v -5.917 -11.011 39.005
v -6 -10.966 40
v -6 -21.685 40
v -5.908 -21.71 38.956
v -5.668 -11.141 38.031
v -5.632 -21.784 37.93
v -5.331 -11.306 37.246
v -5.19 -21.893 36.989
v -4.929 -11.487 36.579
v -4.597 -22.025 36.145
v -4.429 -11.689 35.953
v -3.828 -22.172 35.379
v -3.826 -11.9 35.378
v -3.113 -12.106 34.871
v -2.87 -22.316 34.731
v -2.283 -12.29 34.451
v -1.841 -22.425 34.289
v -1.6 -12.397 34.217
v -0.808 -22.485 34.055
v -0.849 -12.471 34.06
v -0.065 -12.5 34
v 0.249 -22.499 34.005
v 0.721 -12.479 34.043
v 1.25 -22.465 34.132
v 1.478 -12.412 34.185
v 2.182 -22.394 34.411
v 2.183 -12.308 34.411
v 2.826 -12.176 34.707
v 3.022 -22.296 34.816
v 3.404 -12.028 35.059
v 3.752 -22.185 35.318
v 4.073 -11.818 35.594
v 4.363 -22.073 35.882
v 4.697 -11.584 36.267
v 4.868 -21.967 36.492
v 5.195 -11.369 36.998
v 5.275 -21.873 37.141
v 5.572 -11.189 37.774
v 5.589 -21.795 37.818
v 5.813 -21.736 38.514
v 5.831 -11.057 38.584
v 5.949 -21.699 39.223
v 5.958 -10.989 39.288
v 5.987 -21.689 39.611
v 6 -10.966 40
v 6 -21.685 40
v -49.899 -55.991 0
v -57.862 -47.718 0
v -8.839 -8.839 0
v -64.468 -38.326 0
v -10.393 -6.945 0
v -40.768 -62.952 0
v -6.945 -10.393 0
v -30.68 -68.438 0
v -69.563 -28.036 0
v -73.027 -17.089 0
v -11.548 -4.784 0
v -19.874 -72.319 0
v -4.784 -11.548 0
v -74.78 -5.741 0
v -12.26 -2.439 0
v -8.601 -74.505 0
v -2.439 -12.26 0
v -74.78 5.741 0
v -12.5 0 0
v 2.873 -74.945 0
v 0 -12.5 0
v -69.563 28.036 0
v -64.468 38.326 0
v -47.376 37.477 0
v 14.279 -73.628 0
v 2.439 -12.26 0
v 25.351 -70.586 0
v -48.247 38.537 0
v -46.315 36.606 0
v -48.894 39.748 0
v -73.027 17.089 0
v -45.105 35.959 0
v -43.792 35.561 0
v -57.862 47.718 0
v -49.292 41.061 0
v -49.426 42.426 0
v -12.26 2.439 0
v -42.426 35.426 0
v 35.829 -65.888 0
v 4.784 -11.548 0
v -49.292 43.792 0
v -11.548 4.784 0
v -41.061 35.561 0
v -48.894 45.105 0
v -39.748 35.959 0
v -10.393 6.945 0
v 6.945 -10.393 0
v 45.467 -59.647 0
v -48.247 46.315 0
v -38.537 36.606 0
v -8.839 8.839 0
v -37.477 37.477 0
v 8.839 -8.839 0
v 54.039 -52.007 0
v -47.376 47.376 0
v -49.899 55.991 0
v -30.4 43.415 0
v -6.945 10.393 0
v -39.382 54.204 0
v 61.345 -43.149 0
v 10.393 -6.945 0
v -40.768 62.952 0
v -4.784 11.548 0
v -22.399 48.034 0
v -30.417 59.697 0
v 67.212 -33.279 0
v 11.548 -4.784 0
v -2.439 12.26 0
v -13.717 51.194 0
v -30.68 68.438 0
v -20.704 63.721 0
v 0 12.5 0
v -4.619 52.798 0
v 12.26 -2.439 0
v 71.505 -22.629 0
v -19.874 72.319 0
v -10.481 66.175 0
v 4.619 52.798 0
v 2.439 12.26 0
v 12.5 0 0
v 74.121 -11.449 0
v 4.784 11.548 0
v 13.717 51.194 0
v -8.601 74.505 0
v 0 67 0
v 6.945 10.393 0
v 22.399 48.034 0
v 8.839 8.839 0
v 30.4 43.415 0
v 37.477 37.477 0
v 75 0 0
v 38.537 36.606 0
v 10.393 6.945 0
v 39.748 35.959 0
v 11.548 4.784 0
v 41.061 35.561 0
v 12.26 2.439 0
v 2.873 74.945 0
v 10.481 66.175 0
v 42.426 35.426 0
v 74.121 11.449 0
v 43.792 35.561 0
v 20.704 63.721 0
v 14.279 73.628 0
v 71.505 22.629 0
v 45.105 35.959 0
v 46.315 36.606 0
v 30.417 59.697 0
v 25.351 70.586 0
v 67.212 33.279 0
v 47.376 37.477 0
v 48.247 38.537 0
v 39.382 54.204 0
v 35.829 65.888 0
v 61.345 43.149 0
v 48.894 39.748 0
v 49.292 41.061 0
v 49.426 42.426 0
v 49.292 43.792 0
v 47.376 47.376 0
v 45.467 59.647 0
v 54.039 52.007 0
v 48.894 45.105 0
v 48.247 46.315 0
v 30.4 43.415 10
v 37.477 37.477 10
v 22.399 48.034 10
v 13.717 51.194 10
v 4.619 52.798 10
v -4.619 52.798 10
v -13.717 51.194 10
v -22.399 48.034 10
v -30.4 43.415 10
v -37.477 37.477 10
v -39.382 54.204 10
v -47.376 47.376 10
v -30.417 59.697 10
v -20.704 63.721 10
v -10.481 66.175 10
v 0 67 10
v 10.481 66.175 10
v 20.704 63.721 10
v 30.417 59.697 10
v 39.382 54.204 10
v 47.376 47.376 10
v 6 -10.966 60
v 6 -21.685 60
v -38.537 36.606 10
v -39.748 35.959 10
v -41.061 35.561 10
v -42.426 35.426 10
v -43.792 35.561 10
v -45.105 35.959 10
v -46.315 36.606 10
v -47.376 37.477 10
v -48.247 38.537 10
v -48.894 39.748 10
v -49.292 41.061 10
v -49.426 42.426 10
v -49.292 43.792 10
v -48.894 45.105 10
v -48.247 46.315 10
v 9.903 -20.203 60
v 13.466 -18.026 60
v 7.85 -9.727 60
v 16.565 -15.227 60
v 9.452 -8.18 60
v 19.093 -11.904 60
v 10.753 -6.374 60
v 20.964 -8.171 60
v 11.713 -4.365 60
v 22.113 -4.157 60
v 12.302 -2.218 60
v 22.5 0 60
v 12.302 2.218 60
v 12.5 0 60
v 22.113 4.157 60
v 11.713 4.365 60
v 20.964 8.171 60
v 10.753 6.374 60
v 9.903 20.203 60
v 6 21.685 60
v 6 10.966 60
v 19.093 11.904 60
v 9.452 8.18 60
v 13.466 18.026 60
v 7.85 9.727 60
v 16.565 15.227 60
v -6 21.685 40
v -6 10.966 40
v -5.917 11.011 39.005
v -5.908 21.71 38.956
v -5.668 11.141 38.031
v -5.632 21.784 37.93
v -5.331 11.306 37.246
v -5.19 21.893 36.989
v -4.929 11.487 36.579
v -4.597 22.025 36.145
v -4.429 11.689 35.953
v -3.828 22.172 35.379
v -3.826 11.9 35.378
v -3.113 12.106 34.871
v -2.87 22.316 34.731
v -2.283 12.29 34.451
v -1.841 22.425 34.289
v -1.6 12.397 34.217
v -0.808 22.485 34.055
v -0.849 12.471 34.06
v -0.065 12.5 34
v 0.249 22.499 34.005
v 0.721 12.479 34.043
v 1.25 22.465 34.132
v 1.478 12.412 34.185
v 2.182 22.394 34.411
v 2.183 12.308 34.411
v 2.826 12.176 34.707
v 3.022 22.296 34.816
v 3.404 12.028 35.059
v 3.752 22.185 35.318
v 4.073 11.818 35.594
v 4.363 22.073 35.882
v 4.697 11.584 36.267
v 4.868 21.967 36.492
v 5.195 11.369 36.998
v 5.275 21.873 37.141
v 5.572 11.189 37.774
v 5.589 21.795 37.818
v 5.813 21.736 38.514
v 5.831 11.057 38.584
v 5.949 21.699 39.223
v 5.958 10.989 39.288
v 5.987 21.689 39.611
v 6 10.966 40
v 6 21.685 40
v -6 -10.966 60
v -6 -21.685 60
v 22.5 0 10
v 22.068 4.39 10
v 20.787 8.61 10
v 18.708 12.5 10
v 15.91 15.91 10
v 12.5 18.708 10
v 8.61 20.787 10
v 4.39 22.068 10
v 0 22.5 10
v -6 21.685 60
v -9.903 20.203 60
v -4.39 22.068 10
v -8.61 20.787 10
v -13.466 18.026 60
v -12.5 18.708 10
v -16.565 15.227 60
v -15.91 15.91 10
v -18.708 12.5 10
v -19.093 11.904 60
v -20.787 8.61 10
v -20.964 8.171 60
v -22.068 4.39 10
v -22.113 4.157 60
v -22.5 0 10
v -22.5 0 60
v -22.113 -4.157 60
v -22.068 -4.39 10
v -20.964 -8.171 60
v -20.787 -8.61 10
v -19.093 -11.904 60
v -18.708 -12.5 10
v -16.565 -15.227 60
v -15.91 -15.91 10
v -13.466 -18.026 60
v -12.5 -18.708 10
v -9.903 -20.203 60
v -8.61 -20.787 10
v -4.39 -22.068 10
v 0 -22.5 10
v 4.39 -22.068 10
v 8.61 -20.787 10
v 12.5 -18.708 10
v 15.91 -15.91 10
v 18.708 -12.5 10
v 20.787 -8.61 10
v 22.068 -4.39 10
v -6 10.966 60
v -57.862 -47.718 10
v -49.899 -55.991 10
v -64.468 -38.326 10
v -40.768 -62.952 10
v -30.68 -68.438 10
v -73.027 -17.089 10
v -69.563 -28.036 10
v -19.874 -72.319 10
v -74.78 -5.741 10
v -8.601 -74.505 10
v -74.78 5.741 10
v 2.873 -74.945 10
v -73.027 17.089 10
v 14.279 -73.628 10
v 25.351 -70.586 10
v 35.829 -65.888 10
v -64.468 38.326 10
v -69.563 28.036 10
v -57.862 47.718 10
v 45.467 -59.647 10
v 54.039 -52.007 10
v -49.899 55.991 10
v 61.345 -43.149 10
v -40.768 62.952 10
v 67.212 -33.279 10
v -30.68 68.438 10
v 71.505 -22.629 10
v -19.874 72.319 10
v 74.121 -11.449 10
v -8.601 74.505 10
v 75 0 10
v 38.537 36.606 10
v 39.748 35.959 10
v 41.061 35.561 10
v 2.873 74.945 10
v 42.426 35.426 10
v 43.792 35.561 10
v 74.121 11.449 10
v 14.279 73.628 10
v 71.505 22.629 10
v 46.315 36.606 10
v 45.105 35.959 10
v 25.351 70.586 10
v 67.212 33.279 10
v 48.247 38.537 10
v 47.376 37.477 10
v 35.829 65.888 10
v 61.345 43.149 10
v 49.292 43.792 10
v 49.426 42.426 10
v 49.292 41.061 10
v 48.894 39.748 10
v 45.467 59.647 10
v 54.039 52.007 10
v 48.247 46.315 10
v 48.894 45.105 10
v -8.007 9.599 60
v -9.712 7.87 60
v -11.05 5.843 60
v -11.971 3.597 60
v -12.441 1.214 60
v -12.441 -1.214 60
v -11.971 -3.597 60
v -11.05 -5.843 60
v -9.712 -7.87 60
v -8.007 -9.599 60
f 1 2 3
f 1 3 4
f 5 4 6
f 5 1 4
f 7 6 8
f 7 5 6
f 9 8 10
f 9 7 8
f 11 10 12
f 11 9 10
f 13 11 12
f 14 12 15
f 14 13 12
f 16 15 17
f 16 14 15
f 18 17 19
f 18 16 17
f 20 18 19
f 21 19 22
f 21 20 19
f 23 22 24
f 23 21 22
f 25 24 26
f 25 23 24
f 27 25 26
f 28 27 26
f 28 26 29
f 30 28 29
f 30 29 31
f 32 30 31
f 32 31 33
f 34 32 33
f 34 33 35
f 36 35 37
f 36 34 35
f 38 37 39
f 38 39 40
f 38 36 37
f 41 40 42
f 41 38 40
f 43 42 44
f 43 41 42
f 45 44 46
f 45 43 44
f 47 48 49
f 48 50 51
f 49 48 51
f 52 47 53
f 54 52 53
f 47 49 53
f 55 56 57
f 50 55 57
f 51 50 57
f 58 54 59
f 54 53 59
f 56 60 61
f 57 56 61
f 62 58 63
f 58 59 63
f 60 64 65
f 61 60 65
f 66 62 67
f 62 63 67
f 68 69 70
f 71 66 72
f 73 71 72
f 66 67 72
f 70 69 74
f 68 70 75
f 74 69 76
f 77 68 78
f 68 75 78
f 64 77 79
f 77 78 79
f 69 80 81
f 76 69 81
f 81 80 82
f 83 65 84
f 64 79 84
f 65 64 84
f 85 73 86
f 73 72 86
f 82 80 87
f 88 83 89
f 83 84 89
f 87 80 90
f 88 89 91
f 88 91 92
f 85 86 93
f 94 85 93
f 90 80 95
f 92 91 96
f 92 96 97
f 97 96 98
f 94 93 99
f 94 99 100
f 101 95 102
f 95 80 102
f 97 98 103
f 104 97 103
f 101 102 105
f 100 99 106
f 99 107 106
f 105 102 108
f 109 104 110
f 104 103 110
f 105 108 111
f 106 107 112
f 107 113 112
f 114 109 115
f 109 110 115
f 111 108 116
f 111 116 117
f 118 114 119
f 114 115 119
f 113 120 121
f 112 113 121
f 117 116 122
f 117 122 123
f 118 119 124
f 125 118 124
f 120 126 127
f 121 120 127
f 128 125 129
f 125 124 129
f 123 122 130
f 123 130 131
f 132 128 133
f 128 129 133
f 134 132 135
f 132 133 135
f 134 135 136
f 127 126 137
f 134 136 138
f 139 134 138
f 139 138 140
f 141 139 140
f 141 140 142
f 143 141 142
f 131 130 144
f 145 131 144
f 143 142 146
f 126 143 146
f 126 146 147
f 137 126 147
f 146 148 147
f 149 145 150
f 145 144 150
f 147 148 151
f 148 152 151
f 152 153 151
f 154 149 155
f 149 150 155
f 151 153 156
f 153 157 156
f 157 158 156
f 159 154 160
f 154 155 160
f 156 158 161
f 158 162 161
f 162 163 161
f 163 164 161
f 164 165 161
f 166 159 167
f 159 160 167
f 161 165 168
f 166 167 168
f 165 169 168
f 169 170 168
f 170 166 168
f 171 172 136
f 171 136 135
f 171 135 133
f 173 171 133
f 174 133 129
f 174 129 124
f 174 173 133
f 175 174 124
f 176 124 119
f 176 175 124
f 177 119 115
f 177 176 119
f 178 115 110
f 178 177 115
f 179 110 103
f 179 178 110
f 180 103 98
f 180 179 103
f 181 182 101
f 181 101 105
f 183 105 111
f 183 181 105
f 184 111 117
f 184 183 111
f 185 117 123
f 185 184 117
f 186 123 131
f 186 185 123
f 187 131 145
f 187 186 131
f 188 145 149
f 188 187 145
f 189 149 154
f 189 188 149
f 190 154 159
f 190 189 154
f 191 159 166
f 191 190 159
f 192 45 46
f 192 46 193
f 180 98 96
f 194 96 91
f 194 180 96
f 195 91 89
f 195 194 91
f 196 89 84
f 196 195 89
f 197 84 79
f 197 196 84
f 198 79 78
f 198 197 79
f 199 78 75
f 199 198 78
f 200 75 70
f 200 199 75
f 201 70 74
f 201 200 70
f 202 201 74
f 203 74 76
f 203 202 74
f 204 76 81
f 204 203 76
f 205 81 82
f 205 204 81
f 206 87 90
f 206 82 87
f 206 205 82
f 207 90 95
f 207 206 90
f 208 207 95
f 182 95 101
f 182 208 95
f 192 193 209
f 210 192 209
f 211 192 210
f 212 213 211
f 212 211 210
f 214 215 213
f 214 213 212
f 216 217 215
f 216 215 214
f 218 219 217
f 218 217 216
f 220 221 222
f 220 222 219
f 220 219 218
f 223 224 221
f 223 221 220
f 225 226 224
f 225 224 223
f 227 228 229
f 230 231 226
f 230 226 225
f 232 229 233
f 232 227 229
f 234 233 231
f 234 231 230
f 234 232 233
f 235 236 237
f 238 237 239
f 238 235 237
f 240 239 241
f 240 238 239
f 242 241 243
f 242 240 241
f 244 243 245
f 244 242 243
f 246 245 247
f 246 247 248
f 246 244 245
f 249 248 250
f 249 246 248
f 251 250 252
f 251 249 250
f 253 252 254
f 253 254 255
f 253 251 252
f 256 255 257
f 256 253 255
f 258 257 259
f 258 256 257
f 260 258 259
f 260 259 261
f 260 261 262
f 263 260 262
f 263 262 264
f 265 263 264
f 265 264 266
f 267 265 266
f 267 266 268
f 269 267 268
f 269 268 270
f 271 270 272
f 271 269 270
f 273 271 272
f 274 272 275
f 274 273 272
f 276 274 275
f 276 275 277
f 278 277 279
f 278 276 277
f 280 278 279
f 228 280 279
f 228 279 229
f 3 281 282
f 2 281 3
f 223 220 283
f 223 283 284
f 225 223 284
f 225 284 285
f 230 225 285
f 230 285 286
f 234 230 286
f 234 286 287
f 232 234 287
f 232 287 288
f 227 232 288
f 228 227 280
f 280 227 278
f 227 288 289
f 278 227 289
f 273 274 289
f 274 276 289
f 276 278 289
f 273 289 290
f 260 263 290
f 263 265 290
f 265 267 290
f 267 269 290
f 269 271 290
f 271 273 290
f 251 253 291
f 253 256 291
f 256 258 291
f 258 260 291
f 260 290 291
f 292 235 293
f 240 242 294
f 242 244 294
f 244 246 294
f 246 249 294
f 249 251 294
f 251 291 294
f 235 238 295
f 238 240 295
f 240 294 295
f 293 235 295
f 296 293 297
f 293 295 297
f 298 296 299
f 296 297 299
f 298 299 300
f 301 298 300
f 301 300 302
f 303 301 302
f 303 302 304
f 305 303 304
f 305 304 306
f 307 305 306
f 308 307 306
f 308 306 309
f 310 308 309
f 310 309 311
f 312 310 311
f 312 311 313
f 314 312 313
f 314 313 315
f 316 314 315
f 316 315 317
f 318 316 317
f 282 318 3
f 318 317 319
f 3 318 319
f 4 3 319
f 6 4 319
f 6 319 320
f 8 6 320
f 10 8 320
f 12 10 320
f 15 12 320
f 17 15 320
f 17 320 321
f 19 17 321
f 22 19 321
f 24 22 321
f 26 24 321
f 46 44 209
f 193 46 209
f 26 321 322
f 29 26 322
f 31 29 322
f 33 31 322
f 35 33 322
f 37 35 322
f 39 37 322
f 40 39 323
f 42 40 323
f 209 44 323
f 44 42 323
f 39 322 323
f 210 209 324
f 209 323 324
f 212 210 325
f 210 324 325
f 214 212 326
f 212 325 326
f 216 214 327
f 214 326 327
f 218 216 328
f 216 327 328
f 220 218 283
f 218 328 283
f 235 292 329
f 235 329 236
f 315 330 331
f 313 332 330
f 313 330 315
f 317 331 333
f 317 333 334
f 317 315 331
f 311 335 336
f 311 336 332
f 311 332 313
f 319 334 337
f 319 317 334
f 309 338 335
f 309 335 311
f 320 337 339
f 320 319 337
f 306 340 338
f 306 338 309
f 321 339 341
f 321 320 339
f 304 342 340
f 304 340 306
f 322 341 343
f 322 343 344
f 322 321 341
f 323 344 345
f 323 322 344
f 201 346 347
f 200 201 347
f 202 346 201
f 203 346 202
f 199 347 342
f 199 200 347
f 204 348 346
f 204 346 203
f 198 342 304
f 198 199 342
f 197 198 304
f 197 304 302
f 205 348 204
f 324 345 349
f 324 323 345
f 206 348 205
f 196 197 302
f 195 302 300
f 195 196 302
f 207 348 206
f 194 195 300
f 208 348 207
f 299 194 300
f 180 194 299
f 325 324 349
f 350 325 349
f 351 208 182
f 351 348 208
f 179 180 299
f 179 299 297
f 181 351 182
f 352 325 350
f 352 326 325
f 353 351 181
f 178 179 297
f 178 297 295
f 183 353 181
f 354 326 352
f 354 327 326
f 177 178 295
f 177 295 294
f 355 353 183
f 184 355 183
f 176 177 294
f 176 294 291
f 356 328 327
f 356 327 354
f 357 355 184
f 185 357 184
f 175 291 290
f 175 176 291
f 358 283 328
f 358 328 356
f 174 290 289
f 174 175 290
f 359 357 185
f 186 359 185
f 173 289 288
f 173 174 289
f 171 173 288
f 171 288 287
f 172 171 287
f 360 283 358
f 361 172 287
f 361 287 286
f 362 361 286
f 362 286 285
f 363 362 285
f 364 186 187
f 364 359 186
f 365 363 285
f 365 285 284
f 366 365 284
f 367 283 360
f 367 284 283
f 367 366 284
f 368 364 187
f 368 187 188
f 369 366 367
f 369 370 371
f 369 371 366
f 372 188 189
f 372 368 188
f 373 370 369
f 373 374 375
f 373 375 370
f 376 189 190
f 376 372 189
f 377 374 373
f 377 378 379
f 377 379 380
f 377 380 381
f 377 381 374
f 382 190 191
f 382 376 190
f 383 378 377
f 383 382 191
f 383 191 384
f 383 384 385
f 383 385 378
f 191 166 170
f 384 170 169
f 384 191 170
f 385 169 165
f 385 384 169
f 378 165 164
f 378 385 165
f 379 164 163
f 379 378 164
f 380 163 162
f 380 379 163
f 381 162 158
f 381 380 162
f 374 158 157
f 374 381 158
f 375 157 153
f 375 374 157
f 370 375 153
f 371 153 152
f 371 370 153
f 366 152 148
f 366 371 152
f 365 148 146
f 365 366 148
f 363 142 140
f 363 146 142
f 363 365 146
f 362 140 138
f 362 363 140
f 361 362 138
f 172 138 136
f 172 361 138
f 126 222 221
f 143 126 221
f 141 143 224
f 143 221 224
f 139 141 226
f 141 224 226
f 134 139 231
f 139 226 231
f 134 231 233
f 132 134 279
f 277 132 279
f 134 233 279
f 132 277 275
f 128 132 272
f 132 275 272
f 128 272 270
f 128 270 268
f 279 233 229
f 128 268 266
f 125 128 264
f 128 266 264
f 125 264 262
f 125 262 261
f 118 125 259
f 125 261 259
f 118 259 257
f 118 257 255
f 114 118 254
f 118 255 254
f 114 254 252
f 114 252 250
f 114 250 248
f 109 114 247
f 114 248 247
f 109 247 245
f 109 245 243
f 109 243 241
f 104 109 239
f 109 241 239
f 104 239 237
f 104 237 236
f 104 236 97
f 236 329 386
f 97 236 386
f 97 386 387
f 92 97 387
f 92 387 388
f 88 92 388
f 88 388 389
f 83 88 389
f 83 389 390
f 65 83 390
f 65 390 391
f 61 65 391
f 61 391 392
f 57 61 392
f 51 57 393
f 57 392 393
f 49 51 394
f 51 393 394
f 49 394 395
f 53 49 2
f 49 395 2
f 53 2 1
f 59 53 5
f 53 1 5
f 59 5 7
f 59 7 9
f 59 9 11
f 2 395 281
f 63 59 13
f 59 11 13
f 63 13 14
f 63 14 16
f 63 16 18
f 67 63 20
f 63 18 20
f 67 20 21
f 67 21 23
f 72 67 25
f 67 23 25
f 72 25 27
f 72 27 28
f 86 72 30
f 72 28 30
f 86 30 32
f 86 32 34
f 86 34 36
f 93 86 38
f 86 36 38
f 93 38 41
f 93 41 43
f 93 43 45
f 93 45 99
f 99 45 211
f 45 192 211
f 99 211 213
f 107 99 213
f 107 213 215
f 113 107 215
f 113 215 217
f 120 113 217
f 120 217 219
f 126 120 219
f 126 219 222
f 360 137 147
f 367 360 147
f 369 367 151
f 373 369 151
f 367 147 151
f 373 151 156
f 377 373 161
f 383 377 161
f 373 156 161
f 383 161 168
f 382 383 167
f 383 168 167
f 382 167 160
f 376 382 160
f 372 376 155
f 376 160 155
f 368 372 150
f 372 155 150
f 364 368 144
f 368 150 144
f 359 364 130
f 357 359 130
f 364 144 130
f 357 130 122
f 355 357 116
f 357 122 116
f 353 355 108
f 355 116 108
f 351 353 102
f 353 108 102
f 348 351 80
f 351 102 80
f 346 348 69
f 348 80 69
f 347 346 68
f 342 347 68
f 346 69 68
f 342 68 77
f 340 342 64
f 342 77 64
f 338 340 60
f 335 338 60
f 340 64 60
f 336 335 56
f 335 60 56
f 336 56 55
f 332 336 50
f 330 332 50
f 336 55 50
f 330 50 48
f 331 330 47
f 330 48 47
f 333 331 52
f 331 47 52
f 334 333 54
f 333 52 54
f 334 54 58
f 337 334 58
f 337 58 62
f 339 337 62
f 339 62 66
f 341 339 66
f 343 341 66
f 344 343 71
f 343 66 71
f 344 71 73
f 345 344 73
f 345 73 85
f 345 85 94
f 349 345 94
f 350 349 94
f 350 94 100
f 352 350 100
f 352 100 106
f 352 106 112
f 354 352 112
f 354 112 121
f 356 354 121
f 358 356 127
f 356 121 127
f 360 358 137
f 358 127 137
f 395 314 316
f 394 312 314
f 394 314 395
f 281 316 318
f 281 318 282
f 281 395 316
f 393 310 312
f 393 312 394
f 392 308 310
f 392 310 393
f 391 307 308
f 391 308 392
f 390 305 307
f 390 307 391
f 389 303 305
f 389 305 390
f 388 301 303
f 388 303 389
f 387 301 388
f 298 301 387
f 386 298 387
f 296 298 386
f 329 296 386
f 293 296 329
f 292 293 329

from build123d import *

# Parameters (mm, degrees)
SKETCH1_R           = 75
BOSS_EXTRUDE1_DEPTH = 10
SKETCH2_R           = 22.5
BOSS_EXTRUDE2_DEPTH = 50
CUT_EXTRUDE1_DEPTH  = 30
CUT_EXTRUDE2_DEPTH  = 118.260394038
SKETCH5_R           = 12.5
CUT_EXTRUDE3_DEPTH  = 122.86057607


with BuildPart() as part:
    # Sketch1 → Boss-Extrude1 (new body)
    with BuildSketch(Plane.XY):
        Circle(SKETCH1_R)
    extrude(amount=BOSS_EXTRUDE1_DEPTH)

    # Sketch2 → Boss-Extrude2 (add)
    with BuildSketch(Plane.XY.offset(10)):
        Circle(SKETCH2_R)
    extrude(amount=BOSS_EXTRUDE2_DEPTH)

    # Sketch3 → Cut-Extrude1 (cut, symmetric)
    with BuildSketch(Plane(origin=(0, 0, 0), x_dir=(1, 0, 0), z_dir=(0, 1, 0))):
        with BuildLine():
            Line((6, -40), (6, -60))
            ThreePointArc((6, -60), (0, -66), (-6, -60))
            Line((-6, -60), (-6, -40))
            ThreePointArc((-6, -40), (0, -34), (6, -40))
        make_face()
    extrude(amount=CUT_EXTRUDE1_DEPTH, both=True, mode=Mode.SUBTRACT)

    # Sketch4 → Cut-Extrude2 (cut, through all)
    with BuildSketch(Plane.XY.offset(10)):
        with BuildLine():
            ThreePointArc((37.476659403, 37.476659403), (0, 53), (-37.476659403, 37.476659403))
            ThreePointArc((-37.476659403, 37.476659403), (-47.376154339, 37.476659403), (-47.376154339, 47.376154339))
            ThreePointArc((-47.376154339, 47.376154339), (0, 67), (47.376154339, 47.376154339))
            ThreePointArc((47.376154339, 47.376154339), (47.376154339, 37.476659403), (37.476659403, 37.476659403))
        make_face()
    extrude(amount=-CUT_EXTRUDE2_DEPTH, mode=Mode.SUBTRACT)

    # Sketch5 → Cut-Extrude3 (cut, through all)
    with BuildSketch(Plane.XY.offset(60)):
        Circle(SKETCH5_R)
    extrude(amount=-CUT_EXTRUDE3_DEPTH, mode=Mode.SUBTRACT)


solid = part.part
